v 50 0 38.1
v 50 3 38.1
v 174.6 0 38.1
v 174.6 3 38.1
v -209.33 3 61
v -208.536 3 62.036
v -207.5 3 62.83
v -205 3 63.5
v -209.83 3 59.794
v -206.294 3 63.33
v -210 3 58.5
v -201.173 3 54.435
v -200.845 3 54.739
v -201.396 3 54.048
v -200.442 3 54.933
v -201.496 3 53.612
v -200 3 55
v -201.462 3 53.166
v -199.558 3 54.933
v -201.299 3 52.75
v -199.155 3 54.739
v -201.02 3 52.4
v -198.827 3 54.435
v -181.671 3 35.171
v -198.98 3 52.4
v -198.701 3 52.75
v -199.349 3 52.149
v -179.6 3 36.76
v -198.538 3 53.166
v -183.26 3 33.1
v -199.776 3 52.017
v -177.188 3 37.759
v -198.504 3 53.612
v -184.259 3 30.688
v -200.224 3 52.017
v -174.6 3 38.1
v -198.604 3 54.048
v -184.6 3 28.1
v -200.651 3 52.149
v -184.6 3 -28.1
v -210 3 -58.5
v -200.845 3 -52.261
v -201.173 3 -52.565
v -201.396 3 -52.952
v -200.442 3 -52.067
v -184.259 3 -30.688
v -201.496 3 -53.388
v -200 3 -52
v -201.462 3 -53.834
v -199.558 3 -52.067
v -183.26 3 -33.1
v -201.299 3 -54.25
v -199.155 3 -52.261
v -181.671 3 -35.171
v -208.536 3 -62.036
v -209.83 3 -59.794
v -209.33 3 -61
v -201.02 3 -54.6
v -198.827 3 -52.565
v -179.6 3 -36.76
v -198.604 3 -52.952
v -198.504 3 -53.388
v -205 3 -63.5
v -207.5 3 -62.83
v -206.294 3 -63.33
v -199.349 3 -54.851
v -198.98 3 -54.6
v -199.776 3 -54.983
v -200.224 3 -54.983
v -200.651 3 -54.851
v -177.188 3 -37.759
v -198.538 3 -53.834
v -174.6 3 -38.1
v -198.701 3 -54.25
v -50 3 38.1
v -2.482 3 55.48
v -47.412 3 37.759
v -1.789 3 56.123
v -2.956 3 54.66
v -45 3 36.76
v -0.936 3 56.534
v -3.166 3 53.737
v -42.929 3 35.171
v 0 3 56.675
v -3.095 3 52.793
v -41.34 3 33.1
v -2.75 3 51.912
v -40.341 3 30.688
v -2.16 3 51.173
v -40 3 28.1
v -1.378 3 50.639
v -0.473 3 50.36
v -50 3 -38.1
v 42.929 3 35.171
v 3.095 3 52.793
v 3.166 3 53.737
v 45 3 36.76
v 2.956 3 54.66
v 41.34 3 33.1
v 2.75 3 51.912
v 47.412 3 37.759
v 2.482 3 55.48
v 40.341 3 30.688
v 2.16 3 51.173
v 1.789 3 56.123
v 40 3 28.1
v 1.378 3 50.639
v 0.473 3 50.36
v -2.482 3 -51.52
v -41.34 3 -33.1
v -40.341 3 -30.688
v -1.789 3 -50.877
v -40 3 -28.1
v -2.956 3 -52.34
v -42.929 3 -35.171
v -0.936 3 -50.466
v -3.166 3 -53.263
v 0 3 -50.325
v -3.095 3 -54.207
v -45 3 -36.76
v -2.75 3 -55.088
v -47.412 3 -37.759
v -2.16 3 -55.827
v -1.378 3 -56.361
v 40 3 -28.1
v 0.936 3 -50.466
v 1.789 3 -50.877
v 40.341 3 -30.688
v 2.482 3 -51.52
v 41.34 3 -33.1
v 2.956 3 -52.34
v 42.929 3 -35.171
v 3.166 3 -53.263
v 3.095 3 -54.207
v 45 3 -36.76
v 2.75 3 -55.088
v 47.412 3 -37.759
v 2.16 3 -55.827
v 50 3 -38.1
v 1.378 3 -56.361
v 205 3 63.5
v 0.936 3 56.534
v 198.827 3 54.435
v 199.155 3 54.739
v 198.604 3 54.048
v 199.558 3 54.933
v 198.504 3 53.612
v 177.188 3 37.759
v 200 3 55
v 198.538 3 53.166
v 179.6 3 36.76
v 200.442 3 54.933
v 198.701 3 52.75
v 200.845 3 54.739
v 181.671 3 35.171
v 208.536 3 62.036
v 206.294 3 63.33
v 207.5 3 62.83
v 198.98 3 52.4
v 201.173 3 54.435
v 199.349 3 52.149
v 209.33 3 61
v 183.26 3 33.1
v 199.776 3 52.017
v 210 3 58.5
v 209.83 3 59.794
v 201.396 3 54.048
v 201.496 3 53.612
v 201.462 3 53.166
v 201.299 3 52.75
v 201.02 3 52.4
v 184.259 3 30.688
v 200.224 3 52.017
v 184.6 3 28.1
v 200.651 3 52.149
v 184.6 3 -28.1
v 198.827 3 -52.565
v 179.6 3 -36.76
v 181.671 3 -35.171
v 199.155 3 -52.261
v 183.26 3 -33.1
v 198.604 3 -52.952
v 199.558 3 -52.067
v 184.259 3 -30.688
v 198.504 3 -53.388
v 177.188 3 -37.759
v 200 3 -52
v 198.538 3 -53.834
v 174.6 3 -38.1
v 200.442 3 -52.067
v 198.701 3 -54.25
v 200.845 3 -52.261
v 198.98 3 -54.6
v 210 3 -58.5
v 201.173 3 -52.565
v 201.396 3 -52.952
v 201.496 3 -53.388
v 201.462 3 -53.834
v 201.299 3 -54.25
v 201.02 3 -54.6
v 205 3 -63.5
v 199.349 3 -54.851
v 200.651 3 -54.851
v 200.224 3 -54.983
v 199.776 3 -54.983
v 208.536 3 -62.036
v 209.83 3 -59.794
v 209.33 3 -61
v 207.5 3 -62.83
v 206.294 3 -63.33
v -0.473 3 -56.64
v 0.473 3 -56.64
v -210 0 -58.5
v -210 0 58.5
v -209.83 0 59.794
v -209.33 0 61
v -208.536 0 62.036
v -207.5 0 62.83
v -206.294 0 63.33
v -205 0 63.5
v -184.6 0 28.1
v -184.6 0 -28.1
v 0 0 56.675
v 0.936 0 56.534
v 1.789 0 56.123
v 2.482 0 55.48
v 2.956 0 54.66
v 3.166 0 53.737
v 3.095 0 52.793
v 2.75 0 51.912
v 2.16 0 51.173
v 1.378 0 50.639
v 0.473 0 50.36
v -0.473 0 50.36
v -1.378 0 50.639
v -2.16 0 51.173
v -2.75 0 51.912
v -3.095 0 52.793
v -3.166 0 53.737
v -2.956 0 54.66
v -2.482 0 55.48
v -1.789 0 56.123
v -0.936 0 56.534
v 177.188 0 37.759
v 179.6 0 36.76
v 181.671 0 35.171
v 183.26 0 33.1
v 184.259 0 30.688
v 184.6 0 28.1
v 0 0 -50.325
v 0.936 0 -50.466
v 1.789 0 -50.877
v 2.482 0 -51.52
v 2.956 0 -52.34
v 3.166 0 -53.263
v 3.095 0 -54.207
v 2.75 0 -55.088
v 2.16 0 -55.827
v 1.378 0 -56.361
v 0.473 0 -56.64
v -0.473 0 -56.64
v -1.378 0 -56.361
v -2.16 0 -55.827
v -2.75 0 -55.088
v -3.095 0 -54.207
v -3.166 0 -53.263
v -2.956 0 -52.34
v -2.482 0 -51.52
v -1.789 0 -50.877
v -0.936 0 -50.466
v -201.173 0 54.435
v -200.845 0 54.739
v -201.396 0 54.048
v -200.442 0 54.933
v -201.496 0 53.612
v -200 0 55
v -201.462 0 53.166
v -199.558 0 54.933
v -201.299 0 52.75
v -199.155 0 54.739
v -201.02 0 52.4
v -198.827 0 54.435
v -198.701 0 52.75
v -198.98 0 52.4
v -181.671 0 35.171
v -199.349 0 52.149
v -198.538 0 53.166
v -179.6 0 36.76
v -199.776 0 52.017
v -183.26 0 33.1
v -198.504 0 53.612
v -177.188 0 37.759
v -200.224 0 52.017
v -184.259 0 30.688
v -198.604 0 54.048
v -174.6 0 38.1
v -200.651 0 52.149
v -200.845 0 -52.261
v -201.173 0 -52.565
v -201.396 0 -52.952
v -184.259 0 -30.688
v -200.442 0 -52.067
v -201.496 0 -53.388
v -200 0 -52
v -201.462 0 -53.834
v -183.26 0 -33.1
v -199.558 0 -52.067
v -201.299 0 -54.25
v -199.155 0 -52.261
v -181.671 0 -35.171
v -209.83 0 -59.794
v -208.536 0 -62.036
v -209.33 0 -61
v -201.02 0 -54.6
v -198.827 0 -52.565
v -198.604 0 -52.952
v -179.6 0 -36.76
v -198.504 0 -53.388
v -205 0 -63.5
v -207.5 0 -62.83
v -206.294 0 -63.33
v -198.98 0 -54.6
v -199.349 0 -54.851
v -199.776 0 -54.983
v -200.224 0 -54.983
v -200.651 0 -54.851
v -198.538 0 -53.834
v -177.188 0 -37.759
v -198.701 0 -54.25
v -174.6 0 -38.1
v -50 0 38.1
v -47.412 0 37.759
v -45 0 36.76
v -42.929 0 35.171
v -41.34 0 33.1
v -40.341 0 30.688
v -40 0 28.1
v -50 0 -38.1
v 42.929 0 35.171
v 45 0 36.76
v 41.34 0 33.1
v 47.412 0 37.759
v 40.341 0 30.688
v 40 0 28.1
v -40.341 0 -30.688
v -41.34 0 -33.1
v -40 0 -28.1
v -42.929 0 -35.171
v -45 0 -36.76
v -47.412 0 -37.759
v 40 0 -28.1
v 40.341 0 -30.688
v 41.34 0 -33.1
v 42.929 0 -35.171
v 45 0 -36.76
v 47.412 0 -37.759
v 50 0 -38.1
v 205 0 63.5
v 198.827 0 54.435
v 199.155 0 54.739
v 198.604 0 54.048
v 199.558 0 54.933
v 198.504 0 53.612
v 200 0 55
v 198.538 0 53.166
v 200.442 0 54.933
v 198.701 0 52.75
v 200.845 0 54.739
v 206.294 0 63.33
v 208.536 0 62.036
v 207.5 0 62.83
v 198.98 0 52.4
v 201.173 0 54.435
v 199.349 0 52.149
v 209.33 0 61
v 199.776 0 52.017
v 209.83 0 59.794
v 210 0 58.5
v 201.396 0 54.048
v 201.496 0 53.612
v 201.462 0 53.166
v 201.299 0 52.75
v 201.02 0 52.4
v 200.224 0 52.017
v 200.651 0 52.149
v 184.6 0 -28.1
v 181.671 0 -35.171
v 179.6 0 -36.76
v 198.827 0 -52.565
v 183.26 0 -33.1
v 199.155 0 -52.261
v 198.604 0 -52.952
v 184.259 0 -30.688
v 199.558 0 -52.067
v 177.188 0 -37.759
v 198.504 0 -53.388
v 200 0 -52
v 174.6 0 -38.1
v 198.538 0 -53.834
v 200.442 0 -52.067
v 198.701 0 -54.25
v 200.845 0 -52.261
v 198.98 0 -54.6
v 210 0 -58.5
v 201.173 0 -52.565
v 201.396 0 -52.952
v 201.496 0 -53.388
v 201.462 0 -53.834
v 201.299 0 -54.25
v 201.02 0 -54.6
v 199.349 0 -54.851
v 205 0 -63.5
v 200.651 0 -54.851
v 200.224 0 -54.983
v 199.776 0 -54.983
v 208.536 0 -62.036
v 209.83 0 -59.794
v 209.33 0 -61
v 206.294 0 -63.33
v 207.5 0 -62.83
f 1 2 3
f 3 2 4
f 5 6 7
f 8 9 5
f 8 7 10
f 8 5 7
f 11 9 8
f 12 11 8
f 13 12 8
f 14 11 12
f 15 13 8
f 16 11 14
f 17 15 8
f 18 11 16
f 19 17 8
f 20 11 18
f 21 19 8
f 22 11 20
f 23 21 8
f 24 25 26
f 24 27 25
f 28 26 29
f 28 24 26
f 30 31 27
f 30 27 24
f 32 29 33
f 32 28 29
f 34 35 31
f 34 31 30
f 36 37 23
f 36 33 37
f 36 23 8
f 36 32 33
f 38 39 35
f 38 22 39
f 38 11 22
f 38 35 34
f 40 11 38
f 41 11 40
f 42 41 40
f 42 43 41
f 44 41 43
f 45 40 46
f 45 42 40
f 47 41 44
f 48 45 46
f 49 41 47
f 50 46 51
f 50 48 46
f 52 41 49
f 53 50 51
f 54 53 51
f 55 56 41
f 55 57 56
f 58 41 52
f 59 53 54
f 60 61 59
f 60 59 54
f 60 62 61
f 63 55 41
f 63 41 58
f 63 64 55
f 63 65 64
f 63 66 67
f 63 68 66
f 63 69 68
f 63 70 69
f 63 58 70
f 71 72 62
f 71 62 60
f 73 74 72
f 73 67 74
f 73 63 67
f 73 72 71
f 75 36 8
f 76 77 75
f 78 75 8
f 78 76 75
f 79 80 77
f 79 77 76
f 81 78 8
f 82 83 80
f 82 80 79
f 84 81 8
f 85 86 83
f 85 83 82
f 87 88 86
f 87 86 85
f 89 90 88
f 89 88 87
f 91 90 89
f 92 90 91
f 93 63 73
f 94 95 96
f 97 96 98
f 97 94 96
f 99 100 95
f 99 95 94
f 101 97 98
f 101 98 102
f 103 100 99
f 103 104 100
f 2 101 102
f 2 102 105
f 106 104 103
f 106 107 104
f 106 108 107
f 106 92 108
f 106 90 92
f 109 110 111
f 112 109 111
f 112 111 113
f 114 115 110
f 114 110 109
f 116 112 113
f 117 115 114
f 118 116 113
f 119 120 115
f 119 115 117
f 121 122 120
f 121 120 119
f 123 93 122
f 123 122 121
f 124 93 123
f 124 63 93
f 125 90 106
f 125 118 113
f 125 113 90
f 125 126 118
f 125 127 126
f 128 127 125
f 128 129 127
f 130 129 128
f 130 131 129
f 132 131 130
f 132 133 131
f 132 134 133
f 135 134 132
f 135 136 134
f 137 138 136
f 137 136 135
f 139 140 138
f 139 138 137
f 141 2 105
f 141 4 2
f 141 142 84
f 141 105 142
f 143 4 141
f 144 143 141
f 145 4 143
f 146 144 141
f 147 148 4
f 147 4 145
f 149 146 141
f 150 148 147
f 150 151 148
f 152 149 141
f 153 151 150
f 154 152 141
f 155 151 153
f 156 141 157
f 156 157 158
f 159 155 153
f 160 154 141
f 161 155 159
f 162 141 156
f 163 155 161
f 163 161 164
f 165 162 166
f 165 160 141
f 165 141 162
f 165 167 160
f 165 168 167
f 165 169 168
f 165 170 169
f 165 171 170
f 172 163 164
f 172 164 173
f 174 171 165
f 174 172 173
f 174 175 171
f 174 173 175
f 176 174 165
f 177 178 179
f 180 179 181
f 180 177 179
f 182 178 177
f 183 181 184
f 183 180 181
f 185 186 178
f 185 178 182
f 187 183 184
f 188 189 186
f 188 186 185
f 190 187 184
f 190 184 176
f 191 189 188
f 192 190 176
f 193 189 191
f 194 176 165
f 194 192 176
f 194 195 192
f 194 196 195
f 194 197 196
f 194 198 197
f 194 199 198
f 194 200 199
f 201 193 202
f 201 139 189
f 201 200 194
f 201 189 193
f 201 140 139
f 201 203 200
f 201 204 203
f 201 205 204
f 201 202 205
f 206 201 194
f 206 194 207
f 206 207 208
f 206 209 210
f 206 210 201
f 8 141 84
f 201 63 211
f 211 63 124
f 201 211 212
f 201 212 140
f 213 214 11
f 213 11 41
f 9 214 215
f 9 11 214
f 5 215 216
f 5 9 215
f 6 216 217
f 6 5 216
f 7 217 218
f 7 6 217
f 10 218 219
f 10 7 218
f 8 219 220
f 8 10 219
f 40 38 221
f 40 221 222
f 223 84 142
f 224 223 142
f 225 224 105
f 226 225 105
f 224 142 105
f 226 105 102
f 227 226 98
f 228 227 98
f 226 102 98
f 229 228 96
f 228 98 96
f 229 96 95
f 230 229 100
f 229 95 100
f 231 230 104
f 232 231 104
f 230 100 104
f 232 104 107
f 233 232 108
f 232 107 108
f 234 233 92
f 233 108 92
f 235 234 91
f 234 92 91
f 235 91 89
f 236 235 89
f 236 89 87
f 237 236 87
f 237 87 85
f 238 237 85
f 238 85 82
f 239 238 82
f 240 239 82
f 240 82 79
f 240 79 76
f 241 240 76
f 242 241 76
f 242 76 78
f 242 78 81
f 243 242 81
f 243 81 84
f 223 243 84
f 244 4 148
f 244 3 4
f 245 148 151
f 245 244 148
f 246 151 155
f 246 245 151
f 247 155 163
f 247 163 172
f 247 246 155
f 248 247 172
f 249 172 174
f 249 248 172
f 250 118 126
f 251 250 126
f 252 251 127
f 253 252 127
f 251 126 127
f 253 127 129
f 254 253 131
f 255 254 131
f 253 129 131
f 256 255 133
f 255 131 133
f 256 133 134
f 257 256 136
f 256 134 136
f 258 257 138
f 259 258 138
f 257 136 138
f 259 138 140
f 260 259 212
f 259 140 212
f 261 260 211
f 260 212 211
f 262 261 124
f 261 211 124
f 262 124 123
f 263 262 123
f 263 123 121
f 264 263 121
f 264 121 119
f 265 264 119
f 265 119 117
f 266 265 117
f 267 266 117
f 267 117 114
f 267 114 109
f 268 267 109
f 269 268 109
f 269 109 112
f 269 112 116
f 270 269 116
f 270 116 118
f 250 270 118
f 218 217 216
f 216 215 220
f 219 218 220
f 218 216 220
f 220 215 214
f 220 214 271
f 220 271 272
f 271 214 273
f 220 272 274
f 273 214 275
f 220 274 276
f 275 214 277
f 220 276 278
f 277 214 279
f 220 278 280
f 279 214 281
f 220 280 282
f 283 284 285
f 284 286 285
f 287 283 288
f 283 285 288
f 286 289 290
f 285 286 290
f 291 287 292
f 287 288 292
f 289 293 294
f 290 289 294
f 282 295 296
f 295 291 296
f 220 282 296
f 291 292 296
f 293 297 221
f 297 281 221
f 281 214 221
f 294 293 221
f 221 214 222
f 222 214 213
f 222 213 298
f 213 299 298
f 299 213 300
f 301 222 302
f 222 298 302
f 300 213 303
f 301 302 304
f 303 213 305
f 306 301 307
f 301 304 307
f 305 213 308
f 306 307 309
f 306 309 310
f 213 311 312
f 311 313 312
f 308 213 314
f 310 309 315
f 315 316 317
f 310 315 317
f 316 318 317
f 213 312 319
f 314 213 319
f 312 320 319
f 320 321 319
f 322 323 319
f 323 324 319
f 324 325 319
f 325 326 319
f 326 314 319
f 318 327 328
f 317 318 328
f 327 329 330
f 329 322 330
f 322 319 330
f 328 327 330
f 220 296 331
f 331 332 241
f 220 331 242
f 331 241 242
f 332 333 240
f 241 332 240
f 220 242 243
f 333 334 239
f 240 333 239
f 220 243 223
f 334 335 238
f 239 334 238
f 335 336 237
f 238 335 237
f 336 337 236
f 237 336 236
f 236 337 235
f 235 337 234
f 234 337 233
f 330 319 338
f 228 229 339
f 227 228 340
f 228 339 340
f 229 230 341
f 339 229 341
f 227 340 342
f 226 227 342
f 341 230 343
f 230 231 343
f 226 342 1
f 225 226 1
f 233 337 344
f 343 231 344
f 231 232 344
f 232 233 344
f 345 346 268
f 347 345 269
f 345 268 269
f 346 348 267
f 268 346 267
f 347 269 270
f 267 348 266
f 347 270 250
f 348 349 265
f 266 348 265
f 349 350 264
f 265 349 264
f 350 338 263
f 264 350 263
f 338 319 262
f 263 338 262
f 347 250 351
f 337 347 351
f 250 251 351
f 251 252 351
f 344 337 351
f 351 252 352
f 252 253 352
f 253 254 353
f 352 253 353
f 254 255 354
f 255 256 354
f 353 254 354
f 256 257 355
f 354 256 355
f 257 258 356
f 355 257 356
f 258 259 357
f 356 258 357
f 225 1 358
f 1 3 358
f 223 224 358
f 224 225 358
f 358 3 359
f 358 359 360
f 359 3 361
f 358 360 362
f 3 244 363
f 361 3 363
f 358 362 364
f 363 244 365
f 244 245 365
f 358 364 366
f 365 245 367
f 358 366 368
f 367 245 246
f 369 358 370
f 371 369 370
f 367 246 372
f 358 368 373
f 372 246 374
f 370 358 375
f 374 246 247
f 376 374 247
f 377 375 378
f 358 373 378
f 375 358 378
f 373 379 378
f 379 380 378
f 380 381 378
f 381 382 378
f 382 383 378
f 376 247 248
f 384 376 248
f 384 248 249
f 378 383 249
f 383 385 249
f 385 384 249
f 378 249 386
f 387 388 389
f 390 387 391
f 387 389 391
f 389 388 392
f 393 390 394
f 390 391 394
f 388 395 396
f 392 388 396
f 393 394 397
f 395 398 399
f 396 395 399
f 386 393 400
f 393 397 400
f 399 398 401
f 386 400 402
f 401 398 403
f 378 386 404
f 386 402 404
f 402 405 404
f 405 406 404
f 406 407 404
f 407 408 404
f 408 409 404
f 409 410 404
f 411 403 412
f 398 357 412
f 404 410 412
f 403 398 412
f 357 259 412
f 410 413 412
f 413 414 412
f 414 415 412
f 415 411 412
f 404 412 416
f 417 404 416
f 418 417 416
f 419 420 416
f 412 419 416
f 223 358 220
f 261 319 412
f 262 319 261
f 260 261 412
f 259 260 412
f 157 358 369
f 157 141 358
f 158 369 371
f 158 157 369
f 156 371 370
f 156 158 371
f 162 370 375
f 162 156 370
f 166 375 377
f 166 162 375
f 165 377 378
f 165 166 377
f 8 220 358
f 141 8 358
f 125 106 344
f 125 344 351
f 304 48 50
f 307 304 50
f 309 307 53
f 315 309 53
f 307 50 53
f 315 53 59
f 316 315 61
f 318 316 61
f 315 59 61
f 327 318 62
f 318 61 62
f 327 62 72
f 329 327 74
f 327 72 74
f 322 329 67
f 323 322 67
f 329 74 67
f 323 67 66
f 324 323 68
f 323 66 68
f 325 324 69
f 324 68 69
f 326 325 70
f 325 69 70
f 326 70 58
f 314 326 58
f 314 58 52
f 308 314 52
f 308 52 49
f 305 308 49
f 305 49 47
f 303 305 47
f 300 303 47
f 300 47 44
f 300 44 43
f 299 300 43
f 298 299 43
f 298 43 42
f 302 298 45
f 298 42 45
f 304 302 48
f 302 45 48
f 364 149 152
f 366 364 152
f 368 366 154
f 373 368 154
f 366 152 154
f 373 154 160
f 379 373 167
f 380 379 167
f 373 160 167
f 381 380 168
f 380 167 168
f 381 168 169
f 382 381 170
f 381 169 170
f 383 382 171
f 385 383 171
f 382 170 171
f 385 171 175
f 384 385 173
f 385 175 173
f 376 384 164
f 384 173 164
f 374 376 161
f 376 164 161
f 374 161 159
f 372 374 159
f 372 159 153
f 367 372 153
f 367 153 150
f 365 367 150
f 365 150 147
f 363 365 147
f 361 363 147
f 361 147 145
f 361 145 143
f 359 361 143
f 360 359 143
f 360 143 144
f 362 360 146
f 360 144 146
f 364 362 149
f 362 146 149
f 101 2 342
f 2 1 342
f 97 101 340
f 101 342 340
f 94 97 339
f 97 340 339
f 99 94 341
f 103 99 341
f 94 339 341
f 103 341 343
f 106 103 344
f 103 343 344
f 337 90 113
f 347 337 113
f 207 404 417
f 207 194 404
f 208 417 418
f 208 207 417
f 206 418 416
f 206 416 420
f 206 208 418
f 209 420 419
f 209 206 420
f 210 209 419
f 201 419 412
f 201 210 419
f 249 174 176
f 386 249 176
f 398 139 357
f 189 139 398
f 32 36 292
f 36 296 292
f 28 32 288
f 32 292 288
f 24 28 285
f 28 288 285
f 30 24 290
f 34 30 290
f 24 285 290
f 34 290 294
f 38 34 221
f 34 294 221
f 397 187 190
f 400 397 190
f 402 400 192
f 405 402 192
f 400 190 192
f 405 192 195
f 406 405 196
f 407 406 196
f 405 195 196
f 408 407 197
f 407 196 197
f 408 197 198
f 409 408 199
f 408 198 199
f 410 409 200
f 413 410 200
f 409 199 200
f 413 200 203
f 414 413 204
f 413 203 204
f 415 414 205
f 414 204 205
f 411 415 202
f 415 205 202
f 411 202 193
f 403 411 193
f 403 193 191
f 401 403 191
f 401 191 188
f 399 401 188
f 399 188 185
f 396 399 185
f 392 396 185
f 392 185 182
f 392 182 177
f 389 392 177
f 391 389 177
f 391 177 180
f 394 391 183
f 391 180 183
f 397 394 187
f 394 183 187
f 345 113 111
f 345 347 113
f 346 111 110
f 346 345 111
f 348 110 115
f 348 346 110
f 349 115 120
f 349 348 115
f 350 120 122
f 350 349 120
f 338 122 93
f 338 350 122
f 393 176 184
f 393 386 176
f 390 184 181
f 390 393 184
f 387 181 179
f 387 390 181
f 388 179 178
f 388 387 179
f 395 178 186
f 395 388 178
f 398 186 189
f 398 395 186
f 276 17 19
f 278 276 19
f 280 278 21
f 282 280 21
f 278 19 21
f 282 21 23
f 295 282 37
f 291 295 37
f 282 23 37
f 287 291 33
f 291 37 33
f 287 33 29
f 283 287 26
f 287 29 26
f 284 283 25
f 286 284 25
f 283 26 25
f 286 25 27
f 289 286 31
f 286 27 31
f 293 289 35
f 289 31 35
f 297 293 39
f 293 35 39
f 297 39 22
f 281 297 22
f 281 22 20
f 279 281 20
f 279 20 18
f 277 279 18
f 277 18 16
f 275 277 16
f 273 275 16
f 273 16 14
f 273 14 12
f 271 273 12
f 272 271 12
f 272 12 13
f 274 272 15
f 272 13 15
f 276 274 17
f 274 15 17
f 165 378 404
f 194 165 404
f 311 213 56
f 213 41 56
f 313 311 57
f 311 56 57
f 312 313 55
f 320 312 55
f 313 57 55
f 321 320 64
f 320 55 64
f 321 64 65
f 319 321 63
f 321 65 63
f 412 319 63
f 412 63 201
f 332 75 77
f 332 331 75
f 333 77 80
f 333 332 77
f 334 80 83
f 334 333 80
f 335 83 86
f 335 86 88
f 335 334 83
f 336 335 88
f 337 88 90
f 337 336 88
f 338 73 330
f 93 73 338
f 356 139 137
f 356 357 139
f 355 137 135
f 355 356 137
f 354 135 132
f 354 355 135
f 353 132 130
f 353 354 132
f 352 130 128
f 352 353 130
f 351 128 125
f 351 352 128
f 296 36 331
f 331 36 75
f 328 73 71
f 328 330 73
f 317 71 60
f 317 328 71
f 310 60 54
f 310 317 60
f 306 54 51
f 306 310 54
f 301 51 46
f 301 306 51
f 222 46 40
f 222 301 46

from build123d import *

# Parameters (mm, degrees)
SKETCH1_W           = 420
SKETCH1_H           = 127
BOSS_EXTRUDE1_DEPTH = 3
FILLET1_R           = 5
SKETCH2_R           = 1.5
CUT_EXTRUDE1_DEPTH  = 3
SKETCH3_W           = 144.6
SKETCH3_H           = 76.2
CUT_EXTRUDE2_DEPTH  = 3
FILLET2_R           = 10
SKETCH4_R           = 3.175
CUT_EXTRUDE3_DEPTH  = 10


with BuildPart() as part:
    # Sketch1 → Boss-Extrude1 (new body)
    with BuildSketch(Plane(origin=(0, 0, 0), x_dir=(1, 0, 0), z_dir=(0, 1, 0))):
        Rectangle(SKETCH1_W, SKETCH1_H)
    extrude(amount=BOSS_EXTRUDE1_DEPTH)

    # Fillet1
    fillet1_edges = [part.edges().sort_by_distance(p)[0] for p in [
        (210, 1.5, 63.5),
        (-210, 1.5, 63.5),
        (-210, 1.5, -63.5),
        (210, 1.5, -63.5),
    ]]
    fillet(fillet1_edges, radius=FILLET1_R)

    # Sketch2 → Cut-Extrude1 (cut)
    with BuildSketch(Plane(origin=(0, 3, 0), x_dir=(1, 0, 0), z_dir=(0, 1, 0))):
        with Locations(Location((200, -53.5, 0), (0, 0, 270))):
            Circle(SKETCH2_R)
        with Locations(Location((-200, -53.5, 0), (0, 0, 270))):
            Circle(SKETCH2_R)
        with Locations(Location((-200, 53.5, 0), (0, 0, 270))):
            Circle(SKETCH2_R)
        with Locations(Location((200, 53.5, 0), (0, 0, 270))):
            Circle(SKETCH2_R)
    extrude(amount=-CUT_EXTRUDE1_DEPTH, mode=Mode.SUBTRACT)

    # Sketch3 → Cut-Extrude2 (cut)
    with BuildSketch(Plane(origin=(0, 3, 0), x_dir=(1, 0, 0), z_dir=(0, 1, 0))):
        with Locations((112.3, 0)):
            Rectangle(SKETCH3_W, SKETCH3_H)
        with Locations((-112.3, 0)):
            Rectangle(SKETCH3_W, SKETCH3_H)
    extrude(amount=-CUT_EXTRUDE2_DEPTH, mode=Mode.SUBTRACT)

    # Fillet2
    fillet2_edges = [part.edges().sort_by_distance(p)[0] for p in [
        (-184.6, 1.5, -38.1),
        (-40, 1.5, -38.1),
        (-40, 1.5, 38.1),
        (-184.6, 1.5, 38.1),
        (184.6, 1.5, -38.1),
        (184.6, 1.5, 38.1),
        (40, 1.5, 38.1),
        (40, 1.5, -38.1),
    ]]
    fillet(fillet2_edges, radius=FILLET2_R)

    # Sketch4 → Cut-Extrude3 (cut)
    with BuildSketch(Plane(origin=(0, 3, 0), x_dir=(1, 0, 0), z_dir=(0, 1, 0))):
        with Locations(Location((0, 53.5, 0), (0, 0, 270))):
            Circle(SKETCH4_R)
        with Locations(Location((0, -53.5, 0), (0, 0, 270))):
            Circle(SKETCH4_R)
    extrude(amount=-CUT_EXTRUDE3_DEPTH, mode=Mode.SUBTRACT)


solid = part.part
